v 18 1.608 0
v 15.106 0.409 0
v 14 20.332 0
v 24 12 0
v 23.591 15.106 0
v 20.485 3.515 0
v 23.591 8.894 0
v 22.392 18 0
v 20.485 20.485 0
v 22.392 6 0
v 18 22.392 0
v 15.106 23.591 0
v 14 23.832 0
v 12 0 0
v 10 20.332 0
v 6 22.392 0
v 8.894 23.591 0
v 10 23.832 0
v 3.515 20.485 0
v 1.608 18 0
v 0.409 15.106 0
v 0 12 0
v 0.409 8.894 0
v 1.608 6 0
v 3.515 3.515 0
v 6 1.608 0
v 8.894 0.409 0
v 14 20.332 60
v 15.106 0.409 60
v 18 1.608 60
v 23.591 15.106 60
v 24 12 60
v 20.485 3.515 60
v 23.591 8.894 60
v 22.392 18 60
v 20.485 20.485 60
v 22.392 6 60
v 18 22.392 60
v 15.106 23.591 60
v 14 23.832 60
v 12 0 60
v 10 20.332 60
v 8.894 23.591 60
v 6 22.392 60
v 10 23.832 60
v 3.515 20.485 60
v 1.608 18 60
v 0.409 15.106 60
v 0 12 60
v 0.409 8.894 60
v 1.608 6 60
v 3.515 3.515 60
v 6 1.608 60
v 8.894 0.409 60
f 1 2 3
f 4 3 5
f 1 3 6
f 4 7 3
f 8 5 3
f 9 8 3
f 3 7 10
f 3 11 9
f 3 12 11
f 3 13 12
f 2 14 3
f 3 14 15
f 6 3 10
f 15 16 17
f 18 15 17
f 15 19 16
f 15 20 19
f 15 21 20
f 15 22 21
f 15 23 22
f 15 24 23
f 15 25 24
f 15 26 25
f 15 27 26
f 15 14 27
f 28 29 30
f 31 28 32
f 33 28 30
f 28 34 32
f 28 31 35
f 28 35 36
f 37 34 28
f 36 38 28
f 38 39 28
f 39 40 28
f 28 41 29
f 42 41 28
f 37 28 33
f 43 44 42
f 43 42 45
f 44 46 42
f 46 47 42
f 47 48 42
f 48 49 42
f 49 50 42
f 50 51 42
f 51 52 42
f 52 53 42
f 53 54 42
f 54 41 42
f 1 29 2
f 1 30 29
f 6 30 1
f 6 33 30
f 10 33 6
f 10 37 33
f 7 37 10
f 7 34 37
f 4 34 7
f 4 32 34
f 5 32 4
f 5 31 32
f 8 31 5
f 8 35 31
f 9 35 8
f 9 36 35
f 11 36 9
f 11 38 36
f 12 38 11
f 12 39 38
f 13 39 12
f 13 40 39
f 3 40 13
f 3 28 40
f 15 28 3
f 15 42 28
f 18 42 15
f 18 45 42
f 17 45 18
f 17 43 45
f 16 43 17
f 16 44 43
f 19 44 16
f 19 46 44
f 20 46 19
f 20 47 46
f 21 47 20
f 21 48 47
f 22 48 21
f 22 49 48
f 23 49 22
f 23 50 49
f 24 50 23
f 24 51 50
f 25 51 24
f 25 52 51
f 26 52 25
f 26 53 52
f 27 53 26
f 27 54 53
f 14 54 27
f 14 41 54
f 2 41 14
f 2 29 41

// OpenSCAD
$fn = 32;

// ----------------------------------------------------------------------
// Keyway shaft: d24 shaft, key 4 x 3.5 mm
// ----------------------------------------------------------------------

// --- parameters (mm) ---
shaft_r = 12;             // shaft radius
key_w = 4;                // keyway width
key_d = 3.5;              // keyway depth below the surface line
plate_t = 60;             // shaft length, Z (extrusion height)

shaft_d = 2 * shaft_r;  // shaft diameter
circle_step = 15;  // polygon sampling step, degrees

profile = [[8.894, 23.591], [6, 22.392], [3.515, 20.485], [1.608, 18], [0.409, 15.106], [0, 12], [0.409, 8.894], [1.608, 6], [3.515, 3.515], [6, 1.608], [8.894, 0.409], [12, 0], [15.106, 0.409], [18, 1.608], [20.485, 3.515], [22.392, 6], [23.591, 8.894], [24, 12], [23.591, 15.106], [22.392, 18], [20.485, 20.485], [18, 22.392], [15.106, 23.591], [14, 23.832], [14, 20.332], [10, 20.332], [10, 23.832]];  // primary outline, 27 points, counter clockwise

// --- the one profile operation ---
linear_extrude(height = plate_t) polygon(points = profile);
